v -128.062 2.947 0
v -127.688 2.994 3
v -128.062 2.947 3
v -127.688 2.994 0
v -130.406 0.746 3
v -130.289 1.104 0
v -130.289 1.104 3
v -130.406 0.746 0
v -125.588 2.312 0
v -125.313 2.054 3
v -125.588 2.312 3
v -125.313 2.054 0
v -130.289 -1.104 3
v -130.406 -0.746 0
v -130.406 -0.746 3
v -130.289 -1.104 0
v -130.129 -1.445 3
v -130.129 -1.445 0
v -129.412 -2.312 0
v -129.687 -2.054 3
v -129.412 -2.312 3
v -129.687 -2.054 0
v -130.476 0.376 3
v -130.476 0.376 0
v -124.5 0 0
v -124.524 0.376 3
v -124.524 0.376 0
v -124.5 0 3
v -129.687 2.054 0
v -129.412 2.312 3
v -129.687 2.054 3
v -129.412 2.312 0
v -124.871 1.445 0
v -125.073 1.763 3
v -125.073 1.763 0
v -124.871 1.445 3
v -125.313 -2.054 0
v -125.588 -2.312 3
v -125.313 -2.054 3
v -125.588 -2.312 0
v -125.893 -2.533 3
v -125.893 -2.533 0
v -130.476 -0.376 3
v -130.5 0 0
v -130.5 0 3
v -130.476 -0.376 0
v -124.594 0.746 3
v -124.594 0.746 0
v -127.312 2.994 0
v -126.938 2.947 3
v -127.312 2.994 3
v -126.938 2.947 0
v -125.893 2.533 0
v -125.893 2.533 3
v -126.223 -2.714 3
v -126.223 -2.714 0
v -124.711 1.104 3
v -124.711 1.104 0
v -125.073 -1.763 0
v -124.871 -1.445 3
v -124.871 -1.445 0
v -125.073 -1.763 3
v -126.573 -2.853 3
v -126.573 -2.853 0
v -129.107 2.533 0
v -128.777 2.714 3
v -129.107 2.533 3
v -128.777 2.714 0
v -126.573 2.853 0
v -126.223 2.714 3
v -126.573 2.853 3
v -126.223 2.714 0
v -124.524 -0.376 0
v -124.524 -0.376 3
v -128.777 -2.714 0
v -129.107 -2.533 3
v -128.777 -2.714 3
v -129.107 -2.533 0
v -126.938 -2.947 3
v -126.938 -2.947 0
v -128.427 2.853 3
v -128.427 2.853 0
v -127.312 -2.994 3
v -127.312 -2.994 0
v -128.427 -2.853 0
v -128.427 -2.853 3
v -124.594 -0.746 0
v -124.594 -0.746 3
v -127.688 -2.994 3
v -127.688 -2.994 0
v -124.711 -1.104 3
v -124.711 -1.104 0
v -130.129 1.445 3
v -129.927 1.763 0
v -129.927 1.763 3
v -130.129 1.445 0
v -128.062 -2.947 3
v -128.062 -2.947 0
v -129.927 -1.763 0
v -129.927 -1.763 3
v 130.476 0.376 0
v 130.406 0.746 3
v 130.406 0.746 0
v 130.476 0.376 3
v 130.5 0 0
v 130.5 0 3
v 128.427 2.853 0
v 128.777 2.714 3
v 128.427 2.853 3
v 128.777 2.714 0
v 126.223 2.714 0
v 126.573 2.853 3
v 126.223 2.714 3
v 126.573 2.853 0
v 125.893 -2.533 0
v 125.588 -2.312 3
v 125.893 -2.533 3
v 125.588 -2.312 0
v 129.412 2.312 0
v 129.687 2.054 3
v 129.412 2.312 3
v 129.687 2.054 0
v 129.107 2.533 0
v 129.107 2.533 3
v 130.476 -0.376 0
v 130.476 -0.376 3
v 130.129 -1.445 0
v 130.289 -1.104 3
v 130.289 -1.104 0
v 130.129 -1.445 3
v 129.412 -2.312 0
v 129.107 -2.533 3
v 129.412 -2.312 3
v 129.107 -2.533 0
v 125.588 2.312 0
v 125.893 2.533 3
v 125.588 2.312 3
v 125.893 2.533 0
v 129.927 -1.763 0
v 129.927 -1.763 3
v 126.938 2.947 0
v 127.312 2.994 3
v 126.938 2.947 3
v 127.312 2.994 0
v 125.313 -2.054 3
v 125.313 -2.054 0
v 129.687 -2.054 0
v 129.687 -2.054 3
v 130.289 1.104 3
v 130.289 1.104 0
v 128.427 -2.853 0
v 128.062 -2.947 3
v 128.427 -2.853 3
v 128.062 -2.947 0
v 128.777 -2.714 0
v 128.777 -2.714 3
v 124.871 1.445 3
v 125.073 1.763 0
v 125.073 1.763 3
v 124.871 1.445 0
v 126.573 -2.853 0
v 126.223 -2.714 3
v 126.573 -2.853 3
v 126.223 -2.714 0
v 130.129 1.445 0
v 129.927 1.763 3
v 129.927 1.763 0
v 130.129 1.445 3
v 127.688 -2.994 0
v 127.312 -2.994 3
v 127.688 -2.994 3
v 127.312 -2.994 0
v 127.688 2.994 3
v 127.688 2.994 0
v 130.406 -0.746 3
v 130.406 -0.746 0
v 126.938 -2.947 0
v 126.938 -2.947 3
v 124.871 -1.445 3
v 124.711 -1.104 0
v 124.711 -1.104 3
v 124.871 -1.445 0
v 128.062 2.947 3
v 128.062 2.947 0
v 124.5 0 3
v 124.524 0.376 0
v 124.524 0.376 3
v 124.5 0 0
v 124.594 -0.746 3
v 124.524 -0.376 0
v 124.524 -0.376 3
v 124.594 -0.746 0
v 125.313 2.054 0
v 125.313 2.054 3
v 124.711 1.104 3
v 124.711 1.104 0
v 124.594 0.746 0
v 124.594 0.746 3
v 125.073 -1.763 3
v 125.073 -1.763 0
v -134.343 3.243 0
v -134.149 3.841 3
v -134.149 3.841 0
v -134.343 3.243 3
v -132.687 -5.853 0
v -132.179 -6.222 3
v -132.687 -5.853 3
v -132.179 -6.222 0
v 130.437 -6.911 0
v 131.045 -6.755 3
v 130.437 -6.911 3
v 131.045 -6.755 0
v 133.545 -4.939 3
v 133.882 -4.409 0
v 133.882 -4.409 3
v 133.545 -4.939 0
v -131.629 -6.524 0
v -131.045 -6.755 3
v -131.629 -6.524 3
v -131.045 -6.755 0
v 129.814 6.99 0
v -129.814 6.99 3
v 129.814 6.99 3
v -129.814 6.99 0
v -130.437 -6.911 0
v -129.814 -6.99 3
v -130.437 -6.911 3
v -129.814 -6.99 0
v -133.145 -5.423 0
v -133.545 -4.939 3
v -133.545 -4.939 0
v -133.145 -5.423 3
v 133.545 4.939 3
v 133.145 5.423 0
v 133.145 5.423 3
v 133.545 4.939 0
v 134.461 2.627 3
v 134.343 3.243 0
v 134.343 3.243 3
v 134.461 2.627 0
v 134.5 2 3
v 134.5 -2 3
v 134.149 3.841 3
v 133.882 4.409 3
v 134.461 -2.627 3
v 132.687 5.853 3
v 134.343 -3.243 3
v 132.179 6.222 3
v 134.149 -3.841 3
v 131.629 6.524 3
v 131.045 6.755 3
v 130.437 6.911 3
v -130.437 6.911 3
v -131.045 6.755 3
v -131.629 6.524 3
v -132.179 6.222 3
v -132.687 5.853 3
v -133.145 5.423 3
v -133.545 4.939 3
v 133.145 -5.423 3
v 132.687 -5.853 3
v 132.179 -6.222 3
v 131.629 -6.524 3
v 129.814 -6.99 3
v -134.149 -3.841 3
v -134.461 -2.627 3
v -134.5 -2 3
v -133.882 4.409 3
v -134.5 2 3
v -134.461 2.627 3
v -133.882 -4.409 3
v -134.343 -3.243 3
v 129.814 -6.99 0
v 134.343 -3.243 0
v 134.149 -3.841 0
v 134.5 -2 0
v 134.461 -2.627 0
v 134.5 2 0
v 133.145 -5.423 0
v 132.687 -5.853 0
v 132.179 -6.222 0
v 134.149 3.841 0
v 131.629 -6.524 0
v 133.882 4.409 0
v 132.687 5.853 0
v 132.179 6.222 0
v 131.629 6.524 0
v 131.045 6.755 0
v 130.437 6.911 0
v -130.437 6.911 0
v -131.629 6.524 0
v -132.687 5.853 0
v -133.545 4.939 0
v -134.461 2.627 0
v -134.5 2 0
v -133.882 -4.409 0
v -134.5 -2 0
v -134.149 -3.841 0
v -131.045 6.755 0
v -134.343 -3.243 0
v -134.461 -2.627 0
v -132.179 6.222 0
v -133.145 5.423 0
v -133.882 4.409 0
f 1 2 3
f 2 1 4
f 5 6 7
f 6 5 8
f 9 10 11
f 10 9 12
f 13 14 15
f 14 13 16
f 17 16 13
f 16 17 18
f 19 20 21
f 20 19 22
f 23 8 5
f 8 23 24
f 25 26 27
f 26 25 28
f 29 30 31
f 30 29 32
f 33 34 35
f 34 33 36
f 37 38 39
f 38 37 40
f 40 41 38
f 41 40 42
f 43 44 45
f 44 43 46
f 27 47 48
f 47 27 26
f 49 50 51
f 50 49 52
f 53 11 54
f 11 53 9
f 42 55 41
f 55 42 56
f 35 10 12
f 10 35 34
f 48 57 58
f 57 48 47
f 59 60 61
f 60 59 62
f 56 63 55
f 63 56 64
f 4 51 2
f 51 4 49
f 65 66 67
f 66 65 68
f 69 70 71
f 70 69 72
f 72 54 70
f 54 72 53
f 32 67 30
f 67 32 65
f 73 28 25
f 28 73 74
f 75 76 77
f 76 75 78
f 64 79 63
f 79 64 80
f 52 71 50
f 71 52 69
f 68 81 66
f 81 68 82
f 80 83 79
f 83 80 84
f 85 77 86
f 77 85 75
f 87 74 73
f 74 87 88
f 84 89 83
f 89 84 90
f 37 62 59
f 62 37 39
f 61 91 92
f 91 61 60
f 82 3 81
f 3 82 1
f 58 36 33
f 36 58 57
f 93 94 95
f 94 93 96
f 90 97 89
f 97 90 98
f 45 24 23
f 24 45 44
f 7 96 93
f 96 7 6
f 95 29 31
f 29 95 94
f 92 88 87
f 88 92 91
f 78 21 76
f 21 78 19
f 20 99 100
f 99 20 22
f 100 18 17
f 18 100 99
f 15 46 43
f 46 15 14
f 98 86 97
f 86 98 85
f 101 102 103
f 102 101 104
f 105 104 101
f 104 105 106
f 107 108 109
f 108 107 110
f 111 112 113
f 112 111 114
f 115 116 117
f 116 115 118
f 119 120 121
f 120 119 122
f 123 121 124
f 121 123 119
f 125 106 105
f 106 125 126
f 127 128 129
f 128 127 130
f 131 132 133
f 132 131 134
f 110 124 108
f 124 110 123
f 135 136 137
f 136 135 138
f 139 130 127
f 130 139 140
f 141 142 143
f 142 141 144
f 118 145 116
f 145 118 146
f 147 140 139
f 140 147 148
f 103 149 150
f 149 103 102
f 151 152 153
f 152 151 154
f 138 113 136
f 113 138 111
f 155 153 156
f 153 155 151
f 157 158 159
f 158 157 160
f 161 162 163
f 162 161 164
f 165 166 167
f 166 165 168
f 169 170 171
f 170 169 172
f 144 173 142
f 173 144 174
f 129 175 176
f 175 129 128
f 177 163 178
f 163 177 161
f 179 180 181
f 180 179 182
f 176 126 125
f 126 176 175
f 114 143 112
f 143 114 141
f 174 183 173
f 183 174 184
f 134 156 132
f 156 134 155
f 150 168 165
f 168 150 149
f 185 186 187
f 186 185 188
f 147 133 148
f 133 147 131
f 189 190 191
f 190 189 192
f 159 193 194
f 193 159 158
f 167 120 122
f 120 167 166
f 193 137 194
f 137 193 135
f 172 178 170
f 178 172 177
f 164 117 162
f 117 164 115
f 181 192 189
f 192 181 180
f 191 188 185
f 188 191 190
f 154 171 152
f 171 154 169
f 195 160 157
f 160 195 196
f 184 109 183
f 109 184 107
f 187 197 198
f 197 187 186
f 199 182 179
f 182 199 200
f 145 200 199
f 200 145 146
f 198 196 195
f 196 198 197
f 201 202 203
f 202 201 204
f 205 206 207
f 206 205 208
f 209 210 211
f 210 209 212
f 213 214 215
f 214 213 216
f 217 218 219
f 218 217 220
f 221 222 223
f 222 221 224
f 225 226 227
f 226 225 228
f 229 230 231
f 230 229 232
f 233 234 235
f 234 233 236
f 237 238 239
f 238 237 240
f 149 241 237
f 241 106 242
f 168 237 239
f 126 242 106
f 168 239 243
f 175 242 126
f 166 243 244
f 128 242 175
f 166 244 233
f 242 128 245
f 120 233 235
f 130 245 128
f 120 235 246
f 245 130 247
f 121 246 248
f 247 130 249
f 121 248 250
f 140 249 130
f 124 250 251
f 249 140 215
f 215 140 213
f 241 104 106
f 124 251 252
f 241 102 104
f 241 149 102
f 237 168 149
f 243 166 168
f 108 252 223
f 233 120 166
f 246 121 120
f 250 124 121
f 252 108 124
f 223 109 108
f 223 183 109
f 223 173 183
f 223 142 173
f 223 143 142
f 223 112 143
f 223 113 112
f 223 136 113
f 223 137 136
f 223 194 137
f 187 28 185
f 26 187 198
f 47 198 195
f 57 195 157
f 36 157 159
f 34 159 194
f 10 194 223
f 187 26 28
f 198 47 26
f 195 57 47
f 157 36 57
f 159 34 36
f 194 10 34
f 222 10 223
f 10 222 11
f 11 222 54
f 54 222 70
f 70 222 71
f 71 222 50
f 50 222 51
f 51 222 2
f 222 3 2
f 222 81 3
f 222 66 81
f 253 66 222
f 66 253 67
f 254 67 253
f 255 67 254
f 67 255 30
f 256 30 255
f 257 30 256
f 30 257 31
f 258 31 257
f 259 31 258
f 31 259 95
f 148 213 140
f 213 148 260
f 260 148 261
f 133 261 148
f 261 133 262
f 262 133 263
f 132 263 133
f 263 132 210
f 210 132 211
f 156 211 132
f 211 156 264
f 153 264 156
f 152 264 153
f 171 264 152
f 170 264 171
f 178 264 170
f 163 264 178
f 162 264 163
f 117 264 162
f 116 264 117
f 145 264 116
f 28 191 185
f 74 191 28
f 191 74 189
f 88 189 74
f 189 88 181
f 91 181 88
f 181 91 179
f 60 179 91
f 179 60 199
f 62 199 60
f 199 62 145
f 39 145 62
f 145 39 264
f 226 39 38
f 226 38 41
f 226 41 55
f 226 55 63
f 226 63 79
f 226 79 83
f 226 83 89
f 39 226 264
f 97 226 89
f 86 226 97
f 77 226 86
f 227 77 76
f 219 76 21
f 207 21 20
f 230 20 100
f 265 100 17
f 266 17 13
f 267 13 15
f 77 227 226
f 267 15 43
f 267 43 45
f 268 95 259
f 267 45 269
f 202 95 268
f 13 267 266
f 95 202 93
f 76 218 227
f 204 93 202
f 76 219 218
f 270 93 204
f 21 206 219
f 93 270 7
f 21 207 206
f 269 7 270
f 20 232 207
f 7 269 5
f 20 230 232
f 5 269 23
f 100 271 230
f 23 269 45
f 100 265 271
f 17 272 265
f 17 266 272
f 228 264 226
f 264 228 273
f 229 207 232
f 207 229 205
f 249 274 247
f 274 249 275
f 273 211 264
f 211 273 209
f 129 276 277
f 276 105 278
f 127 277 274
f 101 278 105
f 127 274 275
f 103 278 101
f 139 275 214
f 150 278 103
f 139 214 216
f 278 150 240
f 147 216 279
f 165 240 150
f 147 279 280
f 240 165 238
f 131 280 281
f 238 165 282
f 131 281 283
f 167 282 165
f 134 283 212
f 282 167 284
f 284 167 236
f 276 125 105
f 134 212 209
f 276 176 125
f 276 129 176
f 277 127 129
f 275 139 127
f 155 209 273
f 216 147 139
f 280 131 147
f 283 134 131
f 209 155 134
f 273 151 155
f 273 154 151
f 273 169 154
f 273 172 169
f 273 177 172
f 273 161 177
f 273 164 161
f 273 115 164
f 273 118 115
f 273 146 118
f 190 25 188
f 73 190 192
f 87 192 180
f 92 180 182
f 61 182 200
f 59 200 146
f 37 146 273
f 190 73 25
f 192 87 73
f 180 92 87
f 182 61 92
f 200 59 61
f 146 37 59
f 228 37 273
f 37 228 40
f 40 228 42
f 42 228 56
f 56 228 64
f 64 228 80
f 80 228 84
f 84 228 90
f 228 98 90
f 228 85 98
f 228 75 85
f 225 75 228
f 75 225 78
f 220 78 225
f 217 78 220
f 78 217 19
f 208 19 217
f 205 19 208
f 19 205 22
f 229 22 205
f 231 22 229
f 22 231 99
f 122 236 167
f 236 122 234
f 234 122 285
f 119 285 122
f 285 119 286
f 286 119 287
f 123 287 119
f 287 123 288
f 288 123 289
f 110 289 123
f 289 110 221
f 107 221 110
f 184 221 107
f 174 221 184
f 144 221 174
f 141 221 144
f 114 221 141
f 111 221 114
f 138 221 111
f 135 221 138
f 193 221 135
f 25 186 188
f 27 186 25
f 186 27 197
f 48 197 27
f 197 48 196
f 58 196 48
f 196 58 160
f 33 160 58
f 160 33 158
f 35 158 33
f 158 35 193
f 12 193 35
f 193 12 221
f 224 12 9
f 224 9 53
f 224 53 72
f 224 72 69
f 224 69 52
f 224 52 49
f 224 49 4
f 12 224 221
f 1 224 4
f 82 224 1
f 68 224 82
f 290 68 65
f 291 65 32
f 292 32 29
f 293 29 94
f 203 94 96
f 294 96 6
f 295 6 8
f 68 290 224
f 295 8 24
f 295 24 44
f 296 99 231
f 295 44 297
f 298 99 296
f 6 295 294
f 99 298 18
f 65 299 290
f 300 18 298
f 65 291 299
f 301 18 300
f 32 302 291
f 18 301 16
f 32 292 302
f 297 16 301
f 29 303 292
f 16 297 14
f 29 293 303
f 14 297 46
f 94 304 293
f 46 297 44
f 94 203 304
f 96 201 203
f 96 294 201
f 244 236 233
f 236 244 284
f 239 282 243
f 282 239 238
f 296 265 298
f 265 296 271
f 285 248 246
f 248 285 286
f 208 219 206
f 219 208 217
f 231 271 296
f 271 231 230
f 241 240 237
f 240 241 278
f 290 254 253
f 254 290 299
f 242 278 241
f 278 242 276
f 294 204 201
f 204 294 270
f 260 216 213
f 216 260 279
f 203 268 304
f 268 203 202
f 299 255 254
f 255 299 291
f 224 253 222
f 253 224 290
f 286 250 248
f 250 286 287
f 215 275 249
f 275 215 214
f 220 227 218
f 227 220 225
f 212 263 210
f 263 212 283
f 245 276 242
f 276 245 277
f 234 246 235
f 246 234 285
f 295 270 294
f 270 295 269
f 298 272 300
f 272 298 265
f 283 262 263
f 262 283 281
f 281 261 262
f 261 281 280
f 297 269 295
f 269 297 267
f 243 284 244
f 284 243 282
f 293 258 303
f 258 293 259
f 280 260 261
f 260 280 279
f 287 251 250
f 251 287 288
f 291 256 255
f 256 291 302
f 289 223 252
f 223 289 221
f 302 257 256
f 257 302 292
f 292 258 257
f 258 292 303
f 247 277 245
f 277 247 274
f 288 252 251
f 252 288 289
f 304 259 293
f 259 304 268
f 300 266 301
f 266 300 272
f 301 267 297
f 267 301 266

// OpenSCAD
$fn = 50;


difference() {
	union() {
		hull() {
			translate(v = [-129.5000000000, 2.0000000000, 0]) {
				cylinder(h = 3, r = 5);
			}
			translate(v = [129.5000000000, 2.0000000000, 0]) {
				cylinder(h = 3, r = 5);
			}
			translate(v = [-129.5000000000, -2.0000000000, 0]) {
				cylinder(h = 3, r = 5);
			}
			translate(v = [129.5000000000, -2.0000000000, 0]) {
				cylinder(h = 3, r = 5);
			}
		}
	}
	union() {
		translate(v = [-127.5000000000, 0.0000000000, -100.0000000000]) {
			cylinder(h = 200, r = 3.0000000000);
		}
		translate(v = [-127.5000000000, 0.0000000000, -100.0000000000]) {
			cylinder(h = 200, r = 3.0000000000);
		}
		translate(v = [127.5000000000, 0.0000000000, -100.0000000000]) {
			cylinder(h = 200, r = 3.0000000000);
		}
		translate(v = [127.5000000000, 0.0000000000, -100.0000000000]) {
			cylinder(h = 200, r = 3.0000000000);
		}
	}
}
